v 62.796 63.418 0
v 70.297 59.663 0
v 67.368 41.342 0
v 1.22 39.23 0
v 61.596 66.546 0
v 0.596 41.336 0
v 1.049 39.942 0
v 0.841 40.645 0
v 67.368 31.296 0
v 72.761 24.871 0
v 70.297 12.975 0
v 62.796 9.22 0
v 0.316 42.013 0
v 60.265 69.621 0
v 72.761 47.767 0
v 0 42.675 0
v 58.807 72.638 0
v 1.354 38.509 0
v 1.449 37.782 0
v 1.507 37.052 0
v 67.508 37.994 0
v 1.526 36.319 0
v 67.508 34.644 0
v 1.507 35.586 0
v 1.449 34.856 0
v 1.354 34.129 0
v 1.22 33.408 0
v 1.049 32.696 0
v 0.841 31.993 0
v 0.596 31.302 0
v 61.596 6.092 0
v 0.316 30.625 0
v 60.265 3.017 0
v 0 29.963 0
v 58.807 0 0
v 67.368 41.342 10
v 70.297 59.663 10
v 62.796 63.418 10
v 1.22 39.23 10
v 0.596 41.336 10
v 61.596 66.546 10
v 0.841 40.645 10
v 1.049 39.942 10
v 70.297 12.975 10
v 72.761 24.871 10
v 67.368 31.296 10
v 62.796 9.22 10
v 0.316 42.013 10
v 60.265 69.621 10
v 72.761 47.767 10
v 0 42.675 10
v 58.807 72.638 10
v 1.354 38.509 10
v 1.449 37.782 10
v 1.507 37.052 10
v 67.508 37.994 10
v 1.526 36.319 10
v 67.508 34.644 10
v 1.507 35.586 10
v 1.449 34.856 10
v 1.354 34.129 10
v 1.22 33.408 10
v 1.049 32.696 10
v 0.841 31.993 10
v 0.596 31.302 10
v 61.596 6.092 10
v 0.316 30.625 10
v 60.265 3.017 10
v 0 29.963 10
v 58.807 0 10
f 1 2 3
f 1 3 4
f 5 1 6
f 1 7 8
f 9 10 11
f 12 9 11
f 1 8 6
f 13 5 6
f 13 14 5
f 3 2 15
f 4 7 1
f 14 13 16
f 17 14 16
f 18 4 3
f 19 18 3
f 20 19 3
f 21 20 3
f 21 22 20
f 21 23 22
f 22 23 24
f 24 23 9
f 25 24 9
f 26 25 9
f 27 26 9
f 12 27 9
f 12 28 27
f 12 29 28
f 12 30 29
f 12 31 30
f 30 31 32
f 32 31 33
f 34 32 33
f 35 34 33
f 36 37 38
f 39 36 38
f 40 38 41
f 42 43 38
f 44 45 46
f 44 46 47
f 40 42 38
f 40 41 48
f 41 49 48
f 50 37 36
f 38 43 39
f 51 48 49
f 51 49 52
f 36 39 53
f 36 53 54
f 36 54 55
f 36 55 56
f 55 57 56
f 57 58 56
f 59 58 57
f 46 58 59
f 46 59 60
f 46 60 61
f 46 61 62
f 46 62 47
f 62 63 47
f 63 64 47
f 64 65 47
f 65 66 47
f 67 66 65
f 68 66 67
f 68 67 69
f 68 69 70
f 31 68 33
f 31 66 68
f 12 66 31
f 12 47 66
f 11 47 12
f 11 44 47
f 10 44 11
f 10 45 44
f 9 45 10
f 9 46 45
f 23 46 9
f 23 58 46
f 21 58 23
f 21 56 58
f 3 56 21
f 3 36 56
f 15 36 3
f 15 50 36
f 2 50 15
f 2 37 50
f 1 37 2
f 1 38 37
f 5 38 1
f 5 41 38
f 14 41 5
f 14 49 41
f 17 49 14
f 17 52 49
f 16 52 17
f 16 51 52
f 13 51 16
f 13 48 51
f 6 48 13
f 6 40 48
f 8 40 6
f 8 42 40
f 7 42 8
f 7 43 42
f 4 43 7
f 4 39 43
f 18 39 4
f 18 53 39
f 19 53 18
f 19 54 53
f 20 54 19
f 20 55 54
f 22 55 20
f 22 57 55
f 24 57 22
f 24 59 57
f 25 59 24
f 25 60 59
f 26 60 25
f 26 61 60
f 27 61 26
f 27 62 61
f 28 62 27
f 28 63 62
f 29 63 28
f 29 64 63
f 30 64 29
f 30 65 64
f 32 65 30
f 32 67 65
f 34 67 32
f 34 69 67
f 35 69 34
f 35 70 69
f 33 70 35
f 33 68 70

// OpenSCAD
$fn = 32;

// ----------------------------------------------------------------------
// Gear sector: 2 teeth on 54 degrees
// ----------------------------------------------------------------------

// --- parameters (mm) ---
sector_angle = 54;        // sector angle, degrees
root_r = 80;              // root circle radius
tooth_h = 6;              // tooth height over the root circle
teeth = 2;                // number of teeth on the sector
hub_r = 14;               // hub bore radius
plate_t = 10;             // sector thickness, Z
arc_step = 3;             // sampling step of the root/hub arcs, degrees

tip_r = root_r + tooth_h;  // tip circle radius

profile = [[58.807, 0], [60.265, 3.017], [61.596, 6.092], [62.796, 9.22], [70.297, 12.975], [72.761, 24.871], [67.368, 31.296], [67.508, 34.644], [67.508, 37.994], [67.368, 41.342], [72.761, 47.767], [70.297, 59.663], [62.796, 63.418], [61.596, 66.546], [60.265, 69.621], [58.807, 72.638], [0, 42.675], [0.316, 42.013], [0.596, 41.336], [0.841, 40.645], [1.049, 39.942], [1.22, 39.23], [1.354, 38.509], [1.449, 37.782], [1.507, 37.052], [1.526, 36.319], [1.507, 35.586], [1.449, 34.856], [1.354, 34.129], [1.22, 33.408], [1.049, 32.696], [0.841, 31.993], [0.596, 31.302], [0.316, 30.625], [0, 29.963]];  // primary outline, 35 points, counter clockwise

// --- the one profile operation ---
linear_extrude(height = plate_t) polygon(points = profile);
